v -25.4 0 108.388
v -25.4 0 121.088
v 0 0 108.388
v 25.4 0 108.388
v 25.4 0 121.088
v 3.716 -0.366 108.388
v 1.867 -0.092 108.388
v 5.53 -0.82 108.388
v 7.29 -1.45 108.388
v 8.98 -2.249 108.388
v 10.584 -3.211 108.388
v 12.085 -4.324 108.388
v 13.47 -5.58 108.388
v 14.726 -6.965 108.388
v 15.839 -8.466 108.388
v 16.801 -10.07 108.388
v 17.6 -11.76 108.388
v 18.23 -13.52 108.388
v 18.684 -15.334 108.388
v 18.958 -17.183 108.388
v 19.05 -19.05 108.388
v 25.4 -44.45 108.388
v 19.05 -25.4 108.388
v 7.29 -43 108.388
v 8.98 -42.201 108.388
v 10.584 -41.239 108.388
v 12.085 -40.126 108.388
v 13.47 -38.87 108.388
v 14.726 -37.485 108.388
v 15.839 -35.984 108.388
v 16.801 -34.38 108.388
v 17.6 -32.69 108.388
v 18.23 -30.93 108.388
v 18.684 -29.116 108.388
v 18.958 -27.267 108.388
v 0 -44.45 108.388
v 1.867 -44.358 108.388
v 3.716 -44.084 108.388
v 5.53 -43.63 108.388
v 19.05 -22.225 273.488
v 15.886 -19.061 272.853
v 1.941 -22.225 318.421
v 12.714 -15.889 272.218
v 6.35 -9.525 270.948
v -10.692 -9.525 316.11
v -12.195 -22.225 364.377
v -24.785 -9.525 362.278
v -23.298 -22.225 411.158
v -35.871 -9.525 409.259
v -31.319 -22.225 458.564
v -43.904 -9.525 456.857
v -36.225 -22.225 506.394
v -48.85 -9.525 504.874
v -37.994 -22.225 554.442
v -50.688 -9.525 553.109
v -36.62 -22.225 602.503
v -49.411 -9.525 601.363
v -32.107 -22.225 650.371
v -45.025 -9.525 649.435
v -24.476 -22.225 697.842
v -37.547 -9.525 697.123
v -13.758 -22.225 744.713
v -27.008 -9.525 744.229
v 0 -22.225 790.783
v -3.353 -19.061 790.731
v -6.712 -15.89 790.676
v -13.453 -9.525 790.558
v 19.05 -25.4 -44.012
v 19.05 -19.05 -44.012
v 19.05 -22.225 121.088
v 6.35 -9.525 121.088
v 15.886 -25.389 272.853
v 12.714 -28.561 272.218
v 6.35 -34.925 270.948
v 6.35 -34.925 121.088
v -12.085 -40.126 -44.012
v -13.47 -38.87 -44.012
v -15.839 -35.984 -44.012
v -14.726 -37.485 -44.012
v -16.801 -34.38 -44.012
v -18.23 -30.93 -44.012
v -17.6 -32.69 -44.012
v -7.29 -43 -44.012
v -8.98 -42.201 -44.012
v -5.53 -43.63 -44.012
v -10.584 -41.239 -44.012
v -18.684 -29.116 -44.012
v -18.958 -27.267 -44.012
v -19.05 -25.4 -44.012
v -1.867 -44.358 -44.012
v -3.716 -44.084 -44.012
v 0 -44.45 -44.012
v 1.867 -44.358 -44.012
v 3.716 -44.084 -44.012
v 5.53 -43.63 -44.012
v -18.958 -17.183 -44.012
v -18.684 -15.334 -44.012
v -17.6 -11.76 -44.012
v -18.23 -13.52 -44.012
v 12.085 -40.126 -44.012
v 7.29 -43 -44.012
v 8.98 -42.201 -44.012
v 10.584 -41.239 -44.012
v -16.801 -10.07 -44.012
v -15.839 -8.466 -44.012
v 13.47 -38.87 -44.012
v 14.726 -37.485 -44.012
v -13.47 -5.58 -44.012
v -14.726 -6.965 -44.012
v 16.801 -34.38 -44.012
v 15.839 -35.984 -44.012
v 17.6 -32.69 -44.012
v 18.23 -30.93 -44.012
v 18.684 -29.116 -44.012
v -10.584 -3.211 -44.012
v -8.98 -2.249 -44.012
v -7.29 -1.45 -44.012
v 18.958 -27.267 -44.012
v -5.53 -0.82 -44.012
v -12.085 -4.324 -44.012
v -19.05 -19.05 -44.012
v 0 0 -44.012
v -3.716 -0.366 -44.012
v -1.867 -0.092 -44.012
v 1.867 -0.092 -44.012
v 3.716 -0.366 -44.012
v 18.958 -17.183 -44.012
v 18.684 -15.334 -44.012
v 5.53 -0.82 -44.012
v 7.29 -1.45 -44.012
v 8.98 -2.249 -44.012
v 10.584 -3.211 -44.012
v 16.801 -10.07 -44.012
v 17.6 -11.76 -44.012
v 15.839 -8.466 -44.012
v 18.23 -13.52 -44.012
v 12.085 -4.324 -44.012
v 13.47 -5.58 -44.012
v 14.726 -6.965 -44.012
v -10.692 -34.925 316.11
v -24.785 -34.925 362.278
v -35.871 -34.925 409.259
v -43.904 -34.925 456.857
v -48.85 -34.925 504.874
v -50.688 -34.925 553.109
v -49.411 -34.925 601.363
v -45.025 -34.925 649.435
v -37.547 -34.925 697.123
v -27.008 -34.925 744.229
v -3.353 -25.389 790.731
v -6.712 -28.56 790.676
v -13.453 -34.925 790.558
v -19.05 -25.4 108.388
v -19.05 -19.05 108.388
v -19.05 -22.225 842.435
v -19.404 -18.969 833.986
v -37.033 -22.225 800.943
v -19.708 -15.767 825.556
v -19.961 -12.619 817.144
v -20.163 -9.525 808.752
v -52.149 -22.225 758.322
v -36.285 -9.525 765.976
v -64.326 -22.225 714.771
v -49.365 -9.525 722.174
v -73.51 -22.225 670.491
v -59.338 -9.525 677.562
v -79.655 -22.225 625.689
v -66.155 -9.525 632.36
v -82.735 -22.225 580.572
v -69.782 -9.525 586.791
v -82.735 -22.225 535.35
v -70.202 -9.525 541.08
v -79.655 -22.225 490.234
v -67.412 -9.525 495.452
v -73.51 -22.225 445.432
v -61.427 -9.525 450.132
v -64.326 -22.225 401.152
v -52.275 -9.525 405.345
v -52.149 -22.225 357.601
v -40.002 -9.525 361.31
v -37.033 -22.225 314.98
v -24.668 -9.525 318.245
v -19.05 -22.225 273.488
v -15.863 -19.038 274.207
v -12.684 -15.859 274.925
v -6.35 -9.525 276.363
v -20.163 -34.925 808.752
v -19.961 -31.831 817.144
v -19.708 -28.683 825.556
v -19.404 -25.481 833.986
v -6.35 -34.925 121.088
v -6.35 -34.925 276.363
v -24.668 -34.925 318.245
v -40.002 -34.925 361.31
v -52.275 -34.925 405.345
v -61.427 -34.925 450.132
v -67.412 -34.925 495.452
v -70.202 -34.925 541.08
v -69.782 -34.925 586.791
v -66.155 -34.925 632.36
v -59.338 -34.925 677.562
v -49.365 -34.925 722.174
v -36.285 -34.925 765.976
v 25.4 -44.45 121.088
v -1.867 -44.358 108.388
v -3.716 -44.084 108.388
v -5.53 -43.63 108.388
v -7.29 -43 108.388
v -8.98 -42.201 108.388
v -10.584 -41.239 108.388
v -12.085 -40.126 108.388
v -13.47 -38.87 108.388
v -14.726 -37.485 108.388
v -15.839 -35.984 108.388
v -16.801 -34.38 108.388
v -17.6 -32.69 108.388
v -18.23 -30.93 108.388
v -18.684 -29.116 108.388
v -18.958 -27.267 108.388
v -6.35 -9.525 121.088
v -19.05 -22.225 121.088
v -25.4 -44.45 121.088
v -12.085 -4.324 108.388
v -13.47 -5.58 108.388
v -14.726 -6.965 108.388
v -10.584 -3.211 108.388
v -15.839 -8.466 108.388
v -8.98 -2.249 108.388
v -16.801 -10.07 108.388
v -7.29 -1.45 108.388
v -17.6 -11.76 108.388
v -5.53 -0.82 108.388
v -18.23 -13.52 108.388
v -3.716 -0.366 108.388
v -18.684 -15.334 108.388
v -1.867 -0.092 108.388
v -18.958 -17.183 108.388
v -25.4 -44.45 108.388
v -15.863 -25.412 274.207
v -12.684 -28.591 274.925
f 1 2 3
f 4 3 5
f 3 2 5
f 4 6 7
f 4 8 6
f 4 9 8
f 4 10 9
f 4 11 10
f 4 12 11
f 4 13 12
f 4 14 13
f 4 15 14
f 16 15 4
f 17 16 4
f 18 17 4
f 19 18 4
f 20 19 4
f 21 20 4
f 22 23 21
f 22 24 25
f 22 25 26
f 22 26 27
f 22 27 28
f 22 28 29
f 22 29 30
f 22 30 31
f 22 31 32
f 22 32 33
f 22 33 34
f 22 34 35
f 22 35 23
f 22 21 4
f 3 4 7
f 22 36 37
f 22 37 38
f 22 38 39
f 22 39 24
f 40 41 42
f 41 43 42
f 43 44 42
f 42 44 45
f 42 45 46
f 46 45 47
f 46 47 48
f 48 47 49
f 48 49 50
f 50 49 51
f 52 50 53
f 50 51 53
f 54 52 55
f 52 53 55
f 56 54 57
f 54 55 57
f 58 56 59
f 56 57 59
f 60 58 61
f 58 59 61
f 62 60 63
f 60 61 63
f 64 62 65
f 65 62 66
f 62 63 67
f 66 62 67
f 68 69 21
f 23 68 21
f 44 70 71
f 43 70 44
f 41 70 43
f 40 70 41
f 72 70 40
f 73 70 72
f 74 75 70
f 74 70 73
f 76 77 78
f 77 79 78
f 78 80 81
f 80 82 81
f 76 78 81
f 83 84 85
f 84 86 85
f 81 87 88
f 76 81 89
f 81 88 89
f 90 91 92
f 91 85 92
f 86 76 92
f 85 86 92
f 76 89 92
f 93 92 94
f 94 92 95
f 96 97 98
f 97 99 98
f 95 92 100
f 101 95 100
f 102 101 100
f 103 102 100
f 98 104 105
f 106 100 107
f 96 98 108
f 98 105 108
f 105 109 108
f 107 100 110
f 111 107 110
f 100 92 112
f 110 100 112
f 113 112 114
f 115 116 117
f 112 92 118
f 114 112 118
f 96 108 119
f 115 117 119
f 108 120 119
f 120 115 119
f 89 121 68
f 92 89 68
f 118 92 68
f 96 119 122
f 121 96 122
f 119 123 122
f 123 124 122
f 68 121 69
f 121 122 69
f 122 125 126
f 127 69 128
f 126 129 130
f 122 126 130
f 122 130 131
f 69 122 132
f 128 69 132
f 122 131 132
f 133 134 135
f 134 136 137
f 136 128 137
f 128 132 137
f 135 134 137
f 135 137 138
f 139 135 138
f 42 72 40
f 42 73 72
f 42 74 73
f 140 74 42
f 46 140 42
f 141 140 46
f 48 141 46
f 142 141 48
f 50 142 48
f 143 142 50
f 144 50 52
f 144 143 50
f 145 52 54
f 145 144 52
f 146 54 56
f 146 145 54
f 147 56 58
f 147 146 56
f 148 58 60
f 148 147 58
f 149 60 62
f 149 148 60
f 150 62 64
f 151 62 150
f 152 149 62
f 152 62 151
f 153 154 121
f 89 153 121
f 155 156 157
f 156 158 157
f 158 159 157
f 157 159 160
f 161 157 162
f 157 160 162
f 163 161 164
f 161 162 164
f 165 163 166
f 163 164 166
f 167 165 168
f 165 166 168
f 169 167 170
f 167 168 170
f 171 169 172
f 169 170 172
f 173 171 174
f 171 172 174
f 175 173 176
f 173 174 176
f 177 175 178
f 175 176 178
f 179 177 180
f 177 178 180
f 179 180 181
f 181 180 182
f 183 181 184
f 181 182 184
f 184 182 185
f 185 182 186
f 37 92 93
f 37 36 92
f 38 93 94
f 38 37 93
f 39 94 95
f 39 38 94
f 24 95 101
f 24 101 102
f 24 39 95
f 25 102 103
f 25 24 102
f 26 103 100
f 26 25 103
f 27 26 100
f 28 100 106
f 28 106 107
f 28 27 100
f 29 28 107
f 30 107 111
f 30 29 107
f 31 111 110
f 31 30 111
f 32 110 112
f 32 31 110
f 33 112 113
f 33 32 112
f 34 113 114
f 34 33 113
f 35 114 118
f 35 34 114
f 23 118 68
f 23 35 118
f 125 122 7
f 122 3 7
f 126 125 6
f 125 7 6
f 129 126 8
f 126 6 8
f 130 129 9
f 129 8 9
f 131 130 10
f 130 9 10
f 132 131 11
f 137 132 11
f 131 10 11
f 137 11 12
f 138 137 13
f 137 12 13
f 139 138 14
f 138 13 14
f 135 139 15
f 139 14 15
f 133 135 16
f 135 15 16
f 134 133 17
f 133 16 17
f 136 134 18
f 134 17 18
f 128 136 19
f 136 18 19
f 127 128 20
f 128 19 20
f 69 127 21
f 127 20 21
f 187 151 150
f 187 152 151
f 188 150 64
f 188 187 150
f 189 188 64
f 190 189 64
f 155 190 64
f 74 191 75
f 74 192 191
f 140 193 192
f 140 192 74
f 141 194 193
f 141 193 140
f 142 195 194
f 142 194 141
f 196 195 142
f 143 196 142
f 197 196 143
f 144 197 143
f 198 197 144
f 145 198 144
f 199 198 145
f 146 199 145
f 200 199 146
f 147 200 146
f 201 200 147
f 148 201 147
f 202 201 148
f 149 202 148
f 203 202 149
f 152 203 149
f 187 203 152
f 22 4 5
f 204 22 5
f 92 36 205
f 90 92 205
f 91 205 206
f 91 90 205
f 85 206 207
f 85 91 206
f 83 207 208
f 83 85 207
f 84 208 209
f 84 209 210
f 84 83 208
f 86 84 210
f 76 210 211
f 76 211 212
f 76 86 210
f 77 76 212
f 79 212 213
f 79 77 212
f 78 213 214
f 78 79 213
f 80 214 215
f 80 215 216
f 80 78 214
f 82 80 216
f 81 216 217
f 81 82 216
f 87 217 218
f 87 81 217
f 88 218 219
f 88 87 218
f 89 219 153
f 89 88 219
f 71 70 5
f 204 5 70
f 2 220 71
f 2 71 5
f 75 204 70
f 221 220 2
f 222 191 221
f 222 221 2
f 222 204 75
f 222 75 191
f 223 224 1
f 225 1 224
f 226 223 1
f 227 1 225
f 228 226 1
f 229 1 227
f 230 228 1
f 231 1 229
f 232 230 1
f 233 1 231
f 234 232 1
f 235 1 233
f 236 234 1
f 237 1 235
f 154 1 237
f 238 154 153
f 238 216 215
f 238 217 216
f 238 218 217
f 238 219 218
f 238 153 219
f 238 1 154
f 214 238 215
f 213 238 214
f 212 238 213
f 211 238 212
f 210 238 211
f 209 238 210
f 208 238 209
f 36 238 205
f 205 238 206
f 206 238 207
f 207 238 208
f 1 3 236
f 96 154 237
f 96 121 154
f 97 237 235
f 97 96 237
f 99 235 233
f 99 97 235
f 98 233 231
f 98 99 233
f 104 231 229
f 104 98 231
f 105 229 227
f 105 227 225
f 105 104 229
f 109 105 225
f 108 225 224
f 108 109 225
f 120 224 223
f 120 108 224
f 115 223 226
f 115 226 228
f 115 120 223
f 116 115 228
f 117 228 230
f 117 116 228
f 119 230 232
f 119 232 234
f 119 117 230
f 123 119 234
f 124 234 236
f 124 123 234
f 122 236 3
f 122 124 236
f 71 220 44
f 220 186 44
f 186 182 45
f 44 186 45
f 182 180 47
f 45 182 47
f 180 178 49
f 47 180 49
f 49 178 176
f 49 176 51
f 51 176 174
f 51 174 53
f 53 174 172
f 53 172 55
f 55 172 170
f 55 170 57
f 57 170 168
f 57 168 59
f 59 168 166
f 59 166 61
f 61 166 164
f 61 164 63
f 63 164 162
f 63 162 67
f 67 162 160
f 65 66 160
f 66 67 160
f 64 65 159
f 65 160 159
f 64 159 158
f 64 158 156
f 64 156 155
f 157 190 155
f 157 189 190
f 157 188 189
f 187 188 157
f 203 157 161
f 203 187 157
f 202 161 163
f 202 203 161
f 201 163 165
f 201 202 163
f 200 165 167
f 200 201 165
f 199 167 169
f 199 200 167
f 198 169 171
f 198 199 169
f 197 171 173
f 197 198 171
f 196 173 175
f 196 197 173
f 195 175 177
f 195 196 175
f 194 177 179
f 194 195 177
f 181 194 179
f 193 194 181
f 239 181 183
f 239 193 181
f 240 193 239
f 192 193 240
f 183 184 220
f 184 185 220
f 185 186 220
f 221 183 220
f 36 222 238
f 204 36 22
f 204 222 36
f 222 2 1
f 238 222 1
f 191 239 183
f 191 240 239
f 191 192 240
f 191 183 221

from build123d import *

# Parameters (mm, degrees)
F1_DEPTH = 44.45
F3_DEPTH = 44.45
F5_START = -9.525
F5_DEPTH = 25.4
F6_R     = 19.04999
F7_SIZE2 = 12.69999
F7_SIZE  = 12.69999


# Not quite as in the source:
# - a fillet or chamfer is up to 0.001 mm smaller than in the source, because OpenCascade refuses the exact size


with BuildPart() as f1:
    # F0 (on Front) → F1 (new body)
    with BuildSketch(Plane.XZ):
        Polygon((-19.05, -44.0120689886), (0, -44.0120689886), (19.05, -44.0120689886), (19.05, 108.3879310114), (-19.05, 108.3879310114), align=None)
    extrude(amount=F1_DEPTH)

    # F2 (on face) → F3 (join)
    with BuildSketch(Plane.XZ.offset(44.45)):
        Polygon((-25.4, 108.3879310114), (-19.05, 108.3879310114), (19.05, 108.3879310114), (25.4, 108.3879310114), (25.4, 121.0879310114), (-25.4, 121.0879310114), align=None)
    extrude(amount=-F3_DEPTH)

    # F4 (on face) → F5 (join)
    with BuildSketch(Plane.XZ.offset(44.45).offset(F5_START)):
        with BuildLine():
            Line((-19.05, 273.4879310114), (-19.05, 121.0879310114))
            Line((-19.05, 121.0879310114), (19.05, 121.0879310114))
            Line((19.05, 121.0879310114), (19.05, 273.4879310114))
            ThreePointArc((19.05, 273.4879310114), (-37.5025933071, 530.403553002), (0, 790.7828688622))
            Line((0, 790.7828688622), (-19.05, 842.4347043037))
            ThreePointArc((-19.05, 842.4347043037), (-83.1207001827, 557.9613176576), (-19.05, 273.4879310114))
        make_face()
    extrude(amount=-F5_DEPTH)

    # F6 (radius 19.05 in the source; OpenCascade refuses exactly that, so slightly less here)
    f6_edges = [f1.edges().sort_by_distance(p)[0] for p in [
        (19.05, 0, 32.187931),
        (19.05, -44.45, 32.187931),
        (-19.05, -44.45, 32.187931),
        (-19.05, 0, 32.187931),
    ]]
    fillet(f6_edges, radius=F6_R)

    # F7 (size 12.7 and 12.7 in the source; OpenCascade refuses exactly that, so slightly less here)
    f7_edges = [f1.edges().sort_by_distance(p)[0] for p in [
        (-37.502593, -34.925, 530.403553),
        (-37.502593, -9.525, 530.403553),
        (-83.1207, -34.925, 557.961318),
        (-83.1207, -9.525, 557.961318),
        (-9.525, -34.925, 816.608787),
        (-9.525, -9.525, 816.608787),
        (-19.05, -34.925, 197.287931),
        (-19.05, -9.525, 197.287931),
        (19.05, -34.925, 197.287931),
        (19.05, -9.525, 197.287931),
    ]]
    chamfer(f7_edges, length=F7_SIZE, length2=F7_SIZE2)


solid = f1.part
